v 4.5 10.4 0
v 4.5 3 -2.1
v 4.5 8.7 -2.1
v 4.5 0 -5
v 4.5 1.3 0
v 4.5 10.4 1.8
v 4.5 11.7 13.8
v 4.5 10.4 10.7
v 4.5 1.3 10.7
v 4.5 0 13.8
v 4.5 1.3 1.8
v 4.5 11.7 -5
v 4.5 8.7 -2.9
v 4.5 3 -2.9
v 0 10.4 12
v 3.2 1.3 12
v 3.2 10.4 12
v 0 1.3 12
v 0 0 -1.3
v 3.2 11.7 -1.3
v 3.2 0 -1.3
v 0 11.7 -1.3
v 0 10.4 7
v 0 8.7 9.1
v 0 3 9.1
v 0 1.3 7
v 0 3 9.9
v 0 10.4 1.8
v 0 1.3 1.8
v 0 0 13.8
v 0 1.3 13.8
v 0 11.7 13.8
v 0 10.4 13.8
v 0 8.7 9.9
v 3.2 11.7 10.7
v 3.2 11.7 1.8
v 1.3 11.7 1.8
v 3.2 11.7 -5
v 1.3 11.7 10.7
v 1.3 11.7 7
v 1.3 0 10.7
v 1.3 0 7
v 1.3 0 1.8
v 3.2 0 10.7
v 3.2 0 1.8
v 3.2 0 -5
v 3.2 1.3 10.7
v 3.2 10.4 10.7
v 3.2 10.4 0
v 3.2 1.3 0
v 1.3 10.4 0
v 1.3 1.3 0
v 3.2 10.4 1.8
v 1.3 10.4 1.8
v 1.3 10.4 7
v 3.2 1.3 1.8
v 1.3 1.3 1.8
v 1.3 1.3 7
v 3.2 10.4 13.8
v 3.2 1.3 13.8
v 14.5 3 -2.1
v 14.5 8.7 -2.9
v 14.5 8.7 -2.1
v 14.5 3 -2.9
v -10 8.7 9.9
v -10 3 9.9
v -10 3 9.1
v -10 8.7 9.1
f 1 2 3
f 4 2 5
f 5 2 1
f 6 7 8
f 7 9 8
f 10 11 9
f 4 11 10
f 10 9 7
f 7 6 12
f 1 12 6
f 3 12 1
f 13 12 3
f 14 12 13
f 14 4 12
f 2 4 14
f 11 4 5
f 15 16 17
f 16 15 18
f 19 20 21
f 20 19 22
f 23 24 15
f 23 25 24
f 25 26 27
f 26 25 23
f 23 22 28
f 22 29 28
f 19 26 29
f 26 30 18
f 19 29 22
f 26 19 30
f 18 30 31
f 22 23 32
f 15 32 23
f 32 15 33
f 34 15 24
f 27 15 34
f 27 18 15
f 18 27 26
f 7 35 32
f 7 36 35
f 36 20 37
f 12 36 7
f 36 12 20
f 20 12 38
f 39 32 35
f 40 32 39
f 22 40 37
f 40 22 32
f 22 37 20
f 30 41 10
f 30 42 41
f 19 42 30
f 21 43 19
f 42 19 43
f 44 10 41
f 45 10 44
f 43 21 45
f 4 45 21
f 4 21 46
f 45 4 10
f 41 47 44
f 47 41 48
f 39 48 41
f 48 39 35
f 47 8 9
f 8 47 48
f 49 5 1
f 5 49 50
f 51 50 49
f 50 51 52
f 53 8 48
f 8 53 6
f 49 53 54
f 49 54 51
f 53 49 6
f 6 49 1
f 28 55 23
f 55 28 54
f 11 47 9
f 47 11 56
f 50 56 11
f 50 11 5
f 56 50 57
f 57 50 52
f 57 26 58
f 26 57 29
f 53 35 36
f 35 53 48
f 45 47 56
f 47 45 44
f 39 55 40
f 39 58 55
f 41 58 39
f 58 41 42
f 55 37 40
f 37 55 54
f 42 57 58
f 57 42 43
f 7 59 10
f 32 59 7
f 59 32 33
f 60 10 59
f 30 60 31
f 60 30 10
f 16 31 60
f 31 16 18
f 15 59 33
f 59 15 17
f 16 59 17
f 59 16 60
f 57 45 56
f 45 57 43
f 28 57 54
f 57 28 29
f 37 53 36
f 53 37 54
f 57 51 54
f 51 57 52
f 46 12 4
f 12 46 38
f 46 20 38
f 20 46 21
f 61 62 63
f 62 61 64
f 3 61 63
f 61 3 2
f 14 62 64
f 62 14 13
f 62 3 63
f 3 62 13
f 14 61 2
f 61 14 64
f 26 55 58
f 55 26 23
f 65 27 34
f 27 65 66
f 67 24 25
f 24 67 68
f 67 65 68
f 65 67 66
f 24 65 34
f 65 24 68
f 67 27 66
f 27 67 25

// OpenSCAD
WS = 0.3;   // pixel to mm
TH = 1.3 / WS;   // minimum thickness

l1 = 102.47;
l2 = 142.47;
h = abs(l2 - l1);
w = 39;
d = 15;
cw = max(w - 6 / WS, 4 / WS);
cl = 10 / WS;
// echo("Connector length: " + (cl * WS) + "mm");

scale([WS, WS, WS]) {
  // floor & pillars
  difference() {
    translate([0, 0, -TH]) cube([d, w, h + TH]);
    translate([-5, TH, 0]) cube([d + 10, w - TH * 2, h - TH]);
    translate([TH, -5, 0]) cube([d - TH * 2, w + 10, h - TH]);
  }

  // lower box
  cube([d, TH, 6]);
  translate([0, w - TH, 0]) cube([d, TH, 6]);
  cube([TH, w, 6]);

  // lower connector
  translate([d - TH, 0, -5 / WS]) cube([TH, w, 5 / WS]);
  translate([d, (w - cw) / 2, -(5 + 0.8) / 2 / WS]) cube([cl, cw, 0.8 / WS]);

  // upper box
  translate([0, 0, h]) {
    cube([d, TH, 6]);
    translate([0, w - TH, 0]) cube([d, TH, 6]);
    translate([d - TH, 0, 0]) cube([TH, w, 6]);
  }

  // upper connector
  translate([0, 0, h - 5 / WS]) cube([TH, w, 5 / WS]);
  translate([-cl, (w - cw) / 2, h - (5 + 0.8) / 2 / WS]) cube([cl, cw, 0.8 / WS]);
}
